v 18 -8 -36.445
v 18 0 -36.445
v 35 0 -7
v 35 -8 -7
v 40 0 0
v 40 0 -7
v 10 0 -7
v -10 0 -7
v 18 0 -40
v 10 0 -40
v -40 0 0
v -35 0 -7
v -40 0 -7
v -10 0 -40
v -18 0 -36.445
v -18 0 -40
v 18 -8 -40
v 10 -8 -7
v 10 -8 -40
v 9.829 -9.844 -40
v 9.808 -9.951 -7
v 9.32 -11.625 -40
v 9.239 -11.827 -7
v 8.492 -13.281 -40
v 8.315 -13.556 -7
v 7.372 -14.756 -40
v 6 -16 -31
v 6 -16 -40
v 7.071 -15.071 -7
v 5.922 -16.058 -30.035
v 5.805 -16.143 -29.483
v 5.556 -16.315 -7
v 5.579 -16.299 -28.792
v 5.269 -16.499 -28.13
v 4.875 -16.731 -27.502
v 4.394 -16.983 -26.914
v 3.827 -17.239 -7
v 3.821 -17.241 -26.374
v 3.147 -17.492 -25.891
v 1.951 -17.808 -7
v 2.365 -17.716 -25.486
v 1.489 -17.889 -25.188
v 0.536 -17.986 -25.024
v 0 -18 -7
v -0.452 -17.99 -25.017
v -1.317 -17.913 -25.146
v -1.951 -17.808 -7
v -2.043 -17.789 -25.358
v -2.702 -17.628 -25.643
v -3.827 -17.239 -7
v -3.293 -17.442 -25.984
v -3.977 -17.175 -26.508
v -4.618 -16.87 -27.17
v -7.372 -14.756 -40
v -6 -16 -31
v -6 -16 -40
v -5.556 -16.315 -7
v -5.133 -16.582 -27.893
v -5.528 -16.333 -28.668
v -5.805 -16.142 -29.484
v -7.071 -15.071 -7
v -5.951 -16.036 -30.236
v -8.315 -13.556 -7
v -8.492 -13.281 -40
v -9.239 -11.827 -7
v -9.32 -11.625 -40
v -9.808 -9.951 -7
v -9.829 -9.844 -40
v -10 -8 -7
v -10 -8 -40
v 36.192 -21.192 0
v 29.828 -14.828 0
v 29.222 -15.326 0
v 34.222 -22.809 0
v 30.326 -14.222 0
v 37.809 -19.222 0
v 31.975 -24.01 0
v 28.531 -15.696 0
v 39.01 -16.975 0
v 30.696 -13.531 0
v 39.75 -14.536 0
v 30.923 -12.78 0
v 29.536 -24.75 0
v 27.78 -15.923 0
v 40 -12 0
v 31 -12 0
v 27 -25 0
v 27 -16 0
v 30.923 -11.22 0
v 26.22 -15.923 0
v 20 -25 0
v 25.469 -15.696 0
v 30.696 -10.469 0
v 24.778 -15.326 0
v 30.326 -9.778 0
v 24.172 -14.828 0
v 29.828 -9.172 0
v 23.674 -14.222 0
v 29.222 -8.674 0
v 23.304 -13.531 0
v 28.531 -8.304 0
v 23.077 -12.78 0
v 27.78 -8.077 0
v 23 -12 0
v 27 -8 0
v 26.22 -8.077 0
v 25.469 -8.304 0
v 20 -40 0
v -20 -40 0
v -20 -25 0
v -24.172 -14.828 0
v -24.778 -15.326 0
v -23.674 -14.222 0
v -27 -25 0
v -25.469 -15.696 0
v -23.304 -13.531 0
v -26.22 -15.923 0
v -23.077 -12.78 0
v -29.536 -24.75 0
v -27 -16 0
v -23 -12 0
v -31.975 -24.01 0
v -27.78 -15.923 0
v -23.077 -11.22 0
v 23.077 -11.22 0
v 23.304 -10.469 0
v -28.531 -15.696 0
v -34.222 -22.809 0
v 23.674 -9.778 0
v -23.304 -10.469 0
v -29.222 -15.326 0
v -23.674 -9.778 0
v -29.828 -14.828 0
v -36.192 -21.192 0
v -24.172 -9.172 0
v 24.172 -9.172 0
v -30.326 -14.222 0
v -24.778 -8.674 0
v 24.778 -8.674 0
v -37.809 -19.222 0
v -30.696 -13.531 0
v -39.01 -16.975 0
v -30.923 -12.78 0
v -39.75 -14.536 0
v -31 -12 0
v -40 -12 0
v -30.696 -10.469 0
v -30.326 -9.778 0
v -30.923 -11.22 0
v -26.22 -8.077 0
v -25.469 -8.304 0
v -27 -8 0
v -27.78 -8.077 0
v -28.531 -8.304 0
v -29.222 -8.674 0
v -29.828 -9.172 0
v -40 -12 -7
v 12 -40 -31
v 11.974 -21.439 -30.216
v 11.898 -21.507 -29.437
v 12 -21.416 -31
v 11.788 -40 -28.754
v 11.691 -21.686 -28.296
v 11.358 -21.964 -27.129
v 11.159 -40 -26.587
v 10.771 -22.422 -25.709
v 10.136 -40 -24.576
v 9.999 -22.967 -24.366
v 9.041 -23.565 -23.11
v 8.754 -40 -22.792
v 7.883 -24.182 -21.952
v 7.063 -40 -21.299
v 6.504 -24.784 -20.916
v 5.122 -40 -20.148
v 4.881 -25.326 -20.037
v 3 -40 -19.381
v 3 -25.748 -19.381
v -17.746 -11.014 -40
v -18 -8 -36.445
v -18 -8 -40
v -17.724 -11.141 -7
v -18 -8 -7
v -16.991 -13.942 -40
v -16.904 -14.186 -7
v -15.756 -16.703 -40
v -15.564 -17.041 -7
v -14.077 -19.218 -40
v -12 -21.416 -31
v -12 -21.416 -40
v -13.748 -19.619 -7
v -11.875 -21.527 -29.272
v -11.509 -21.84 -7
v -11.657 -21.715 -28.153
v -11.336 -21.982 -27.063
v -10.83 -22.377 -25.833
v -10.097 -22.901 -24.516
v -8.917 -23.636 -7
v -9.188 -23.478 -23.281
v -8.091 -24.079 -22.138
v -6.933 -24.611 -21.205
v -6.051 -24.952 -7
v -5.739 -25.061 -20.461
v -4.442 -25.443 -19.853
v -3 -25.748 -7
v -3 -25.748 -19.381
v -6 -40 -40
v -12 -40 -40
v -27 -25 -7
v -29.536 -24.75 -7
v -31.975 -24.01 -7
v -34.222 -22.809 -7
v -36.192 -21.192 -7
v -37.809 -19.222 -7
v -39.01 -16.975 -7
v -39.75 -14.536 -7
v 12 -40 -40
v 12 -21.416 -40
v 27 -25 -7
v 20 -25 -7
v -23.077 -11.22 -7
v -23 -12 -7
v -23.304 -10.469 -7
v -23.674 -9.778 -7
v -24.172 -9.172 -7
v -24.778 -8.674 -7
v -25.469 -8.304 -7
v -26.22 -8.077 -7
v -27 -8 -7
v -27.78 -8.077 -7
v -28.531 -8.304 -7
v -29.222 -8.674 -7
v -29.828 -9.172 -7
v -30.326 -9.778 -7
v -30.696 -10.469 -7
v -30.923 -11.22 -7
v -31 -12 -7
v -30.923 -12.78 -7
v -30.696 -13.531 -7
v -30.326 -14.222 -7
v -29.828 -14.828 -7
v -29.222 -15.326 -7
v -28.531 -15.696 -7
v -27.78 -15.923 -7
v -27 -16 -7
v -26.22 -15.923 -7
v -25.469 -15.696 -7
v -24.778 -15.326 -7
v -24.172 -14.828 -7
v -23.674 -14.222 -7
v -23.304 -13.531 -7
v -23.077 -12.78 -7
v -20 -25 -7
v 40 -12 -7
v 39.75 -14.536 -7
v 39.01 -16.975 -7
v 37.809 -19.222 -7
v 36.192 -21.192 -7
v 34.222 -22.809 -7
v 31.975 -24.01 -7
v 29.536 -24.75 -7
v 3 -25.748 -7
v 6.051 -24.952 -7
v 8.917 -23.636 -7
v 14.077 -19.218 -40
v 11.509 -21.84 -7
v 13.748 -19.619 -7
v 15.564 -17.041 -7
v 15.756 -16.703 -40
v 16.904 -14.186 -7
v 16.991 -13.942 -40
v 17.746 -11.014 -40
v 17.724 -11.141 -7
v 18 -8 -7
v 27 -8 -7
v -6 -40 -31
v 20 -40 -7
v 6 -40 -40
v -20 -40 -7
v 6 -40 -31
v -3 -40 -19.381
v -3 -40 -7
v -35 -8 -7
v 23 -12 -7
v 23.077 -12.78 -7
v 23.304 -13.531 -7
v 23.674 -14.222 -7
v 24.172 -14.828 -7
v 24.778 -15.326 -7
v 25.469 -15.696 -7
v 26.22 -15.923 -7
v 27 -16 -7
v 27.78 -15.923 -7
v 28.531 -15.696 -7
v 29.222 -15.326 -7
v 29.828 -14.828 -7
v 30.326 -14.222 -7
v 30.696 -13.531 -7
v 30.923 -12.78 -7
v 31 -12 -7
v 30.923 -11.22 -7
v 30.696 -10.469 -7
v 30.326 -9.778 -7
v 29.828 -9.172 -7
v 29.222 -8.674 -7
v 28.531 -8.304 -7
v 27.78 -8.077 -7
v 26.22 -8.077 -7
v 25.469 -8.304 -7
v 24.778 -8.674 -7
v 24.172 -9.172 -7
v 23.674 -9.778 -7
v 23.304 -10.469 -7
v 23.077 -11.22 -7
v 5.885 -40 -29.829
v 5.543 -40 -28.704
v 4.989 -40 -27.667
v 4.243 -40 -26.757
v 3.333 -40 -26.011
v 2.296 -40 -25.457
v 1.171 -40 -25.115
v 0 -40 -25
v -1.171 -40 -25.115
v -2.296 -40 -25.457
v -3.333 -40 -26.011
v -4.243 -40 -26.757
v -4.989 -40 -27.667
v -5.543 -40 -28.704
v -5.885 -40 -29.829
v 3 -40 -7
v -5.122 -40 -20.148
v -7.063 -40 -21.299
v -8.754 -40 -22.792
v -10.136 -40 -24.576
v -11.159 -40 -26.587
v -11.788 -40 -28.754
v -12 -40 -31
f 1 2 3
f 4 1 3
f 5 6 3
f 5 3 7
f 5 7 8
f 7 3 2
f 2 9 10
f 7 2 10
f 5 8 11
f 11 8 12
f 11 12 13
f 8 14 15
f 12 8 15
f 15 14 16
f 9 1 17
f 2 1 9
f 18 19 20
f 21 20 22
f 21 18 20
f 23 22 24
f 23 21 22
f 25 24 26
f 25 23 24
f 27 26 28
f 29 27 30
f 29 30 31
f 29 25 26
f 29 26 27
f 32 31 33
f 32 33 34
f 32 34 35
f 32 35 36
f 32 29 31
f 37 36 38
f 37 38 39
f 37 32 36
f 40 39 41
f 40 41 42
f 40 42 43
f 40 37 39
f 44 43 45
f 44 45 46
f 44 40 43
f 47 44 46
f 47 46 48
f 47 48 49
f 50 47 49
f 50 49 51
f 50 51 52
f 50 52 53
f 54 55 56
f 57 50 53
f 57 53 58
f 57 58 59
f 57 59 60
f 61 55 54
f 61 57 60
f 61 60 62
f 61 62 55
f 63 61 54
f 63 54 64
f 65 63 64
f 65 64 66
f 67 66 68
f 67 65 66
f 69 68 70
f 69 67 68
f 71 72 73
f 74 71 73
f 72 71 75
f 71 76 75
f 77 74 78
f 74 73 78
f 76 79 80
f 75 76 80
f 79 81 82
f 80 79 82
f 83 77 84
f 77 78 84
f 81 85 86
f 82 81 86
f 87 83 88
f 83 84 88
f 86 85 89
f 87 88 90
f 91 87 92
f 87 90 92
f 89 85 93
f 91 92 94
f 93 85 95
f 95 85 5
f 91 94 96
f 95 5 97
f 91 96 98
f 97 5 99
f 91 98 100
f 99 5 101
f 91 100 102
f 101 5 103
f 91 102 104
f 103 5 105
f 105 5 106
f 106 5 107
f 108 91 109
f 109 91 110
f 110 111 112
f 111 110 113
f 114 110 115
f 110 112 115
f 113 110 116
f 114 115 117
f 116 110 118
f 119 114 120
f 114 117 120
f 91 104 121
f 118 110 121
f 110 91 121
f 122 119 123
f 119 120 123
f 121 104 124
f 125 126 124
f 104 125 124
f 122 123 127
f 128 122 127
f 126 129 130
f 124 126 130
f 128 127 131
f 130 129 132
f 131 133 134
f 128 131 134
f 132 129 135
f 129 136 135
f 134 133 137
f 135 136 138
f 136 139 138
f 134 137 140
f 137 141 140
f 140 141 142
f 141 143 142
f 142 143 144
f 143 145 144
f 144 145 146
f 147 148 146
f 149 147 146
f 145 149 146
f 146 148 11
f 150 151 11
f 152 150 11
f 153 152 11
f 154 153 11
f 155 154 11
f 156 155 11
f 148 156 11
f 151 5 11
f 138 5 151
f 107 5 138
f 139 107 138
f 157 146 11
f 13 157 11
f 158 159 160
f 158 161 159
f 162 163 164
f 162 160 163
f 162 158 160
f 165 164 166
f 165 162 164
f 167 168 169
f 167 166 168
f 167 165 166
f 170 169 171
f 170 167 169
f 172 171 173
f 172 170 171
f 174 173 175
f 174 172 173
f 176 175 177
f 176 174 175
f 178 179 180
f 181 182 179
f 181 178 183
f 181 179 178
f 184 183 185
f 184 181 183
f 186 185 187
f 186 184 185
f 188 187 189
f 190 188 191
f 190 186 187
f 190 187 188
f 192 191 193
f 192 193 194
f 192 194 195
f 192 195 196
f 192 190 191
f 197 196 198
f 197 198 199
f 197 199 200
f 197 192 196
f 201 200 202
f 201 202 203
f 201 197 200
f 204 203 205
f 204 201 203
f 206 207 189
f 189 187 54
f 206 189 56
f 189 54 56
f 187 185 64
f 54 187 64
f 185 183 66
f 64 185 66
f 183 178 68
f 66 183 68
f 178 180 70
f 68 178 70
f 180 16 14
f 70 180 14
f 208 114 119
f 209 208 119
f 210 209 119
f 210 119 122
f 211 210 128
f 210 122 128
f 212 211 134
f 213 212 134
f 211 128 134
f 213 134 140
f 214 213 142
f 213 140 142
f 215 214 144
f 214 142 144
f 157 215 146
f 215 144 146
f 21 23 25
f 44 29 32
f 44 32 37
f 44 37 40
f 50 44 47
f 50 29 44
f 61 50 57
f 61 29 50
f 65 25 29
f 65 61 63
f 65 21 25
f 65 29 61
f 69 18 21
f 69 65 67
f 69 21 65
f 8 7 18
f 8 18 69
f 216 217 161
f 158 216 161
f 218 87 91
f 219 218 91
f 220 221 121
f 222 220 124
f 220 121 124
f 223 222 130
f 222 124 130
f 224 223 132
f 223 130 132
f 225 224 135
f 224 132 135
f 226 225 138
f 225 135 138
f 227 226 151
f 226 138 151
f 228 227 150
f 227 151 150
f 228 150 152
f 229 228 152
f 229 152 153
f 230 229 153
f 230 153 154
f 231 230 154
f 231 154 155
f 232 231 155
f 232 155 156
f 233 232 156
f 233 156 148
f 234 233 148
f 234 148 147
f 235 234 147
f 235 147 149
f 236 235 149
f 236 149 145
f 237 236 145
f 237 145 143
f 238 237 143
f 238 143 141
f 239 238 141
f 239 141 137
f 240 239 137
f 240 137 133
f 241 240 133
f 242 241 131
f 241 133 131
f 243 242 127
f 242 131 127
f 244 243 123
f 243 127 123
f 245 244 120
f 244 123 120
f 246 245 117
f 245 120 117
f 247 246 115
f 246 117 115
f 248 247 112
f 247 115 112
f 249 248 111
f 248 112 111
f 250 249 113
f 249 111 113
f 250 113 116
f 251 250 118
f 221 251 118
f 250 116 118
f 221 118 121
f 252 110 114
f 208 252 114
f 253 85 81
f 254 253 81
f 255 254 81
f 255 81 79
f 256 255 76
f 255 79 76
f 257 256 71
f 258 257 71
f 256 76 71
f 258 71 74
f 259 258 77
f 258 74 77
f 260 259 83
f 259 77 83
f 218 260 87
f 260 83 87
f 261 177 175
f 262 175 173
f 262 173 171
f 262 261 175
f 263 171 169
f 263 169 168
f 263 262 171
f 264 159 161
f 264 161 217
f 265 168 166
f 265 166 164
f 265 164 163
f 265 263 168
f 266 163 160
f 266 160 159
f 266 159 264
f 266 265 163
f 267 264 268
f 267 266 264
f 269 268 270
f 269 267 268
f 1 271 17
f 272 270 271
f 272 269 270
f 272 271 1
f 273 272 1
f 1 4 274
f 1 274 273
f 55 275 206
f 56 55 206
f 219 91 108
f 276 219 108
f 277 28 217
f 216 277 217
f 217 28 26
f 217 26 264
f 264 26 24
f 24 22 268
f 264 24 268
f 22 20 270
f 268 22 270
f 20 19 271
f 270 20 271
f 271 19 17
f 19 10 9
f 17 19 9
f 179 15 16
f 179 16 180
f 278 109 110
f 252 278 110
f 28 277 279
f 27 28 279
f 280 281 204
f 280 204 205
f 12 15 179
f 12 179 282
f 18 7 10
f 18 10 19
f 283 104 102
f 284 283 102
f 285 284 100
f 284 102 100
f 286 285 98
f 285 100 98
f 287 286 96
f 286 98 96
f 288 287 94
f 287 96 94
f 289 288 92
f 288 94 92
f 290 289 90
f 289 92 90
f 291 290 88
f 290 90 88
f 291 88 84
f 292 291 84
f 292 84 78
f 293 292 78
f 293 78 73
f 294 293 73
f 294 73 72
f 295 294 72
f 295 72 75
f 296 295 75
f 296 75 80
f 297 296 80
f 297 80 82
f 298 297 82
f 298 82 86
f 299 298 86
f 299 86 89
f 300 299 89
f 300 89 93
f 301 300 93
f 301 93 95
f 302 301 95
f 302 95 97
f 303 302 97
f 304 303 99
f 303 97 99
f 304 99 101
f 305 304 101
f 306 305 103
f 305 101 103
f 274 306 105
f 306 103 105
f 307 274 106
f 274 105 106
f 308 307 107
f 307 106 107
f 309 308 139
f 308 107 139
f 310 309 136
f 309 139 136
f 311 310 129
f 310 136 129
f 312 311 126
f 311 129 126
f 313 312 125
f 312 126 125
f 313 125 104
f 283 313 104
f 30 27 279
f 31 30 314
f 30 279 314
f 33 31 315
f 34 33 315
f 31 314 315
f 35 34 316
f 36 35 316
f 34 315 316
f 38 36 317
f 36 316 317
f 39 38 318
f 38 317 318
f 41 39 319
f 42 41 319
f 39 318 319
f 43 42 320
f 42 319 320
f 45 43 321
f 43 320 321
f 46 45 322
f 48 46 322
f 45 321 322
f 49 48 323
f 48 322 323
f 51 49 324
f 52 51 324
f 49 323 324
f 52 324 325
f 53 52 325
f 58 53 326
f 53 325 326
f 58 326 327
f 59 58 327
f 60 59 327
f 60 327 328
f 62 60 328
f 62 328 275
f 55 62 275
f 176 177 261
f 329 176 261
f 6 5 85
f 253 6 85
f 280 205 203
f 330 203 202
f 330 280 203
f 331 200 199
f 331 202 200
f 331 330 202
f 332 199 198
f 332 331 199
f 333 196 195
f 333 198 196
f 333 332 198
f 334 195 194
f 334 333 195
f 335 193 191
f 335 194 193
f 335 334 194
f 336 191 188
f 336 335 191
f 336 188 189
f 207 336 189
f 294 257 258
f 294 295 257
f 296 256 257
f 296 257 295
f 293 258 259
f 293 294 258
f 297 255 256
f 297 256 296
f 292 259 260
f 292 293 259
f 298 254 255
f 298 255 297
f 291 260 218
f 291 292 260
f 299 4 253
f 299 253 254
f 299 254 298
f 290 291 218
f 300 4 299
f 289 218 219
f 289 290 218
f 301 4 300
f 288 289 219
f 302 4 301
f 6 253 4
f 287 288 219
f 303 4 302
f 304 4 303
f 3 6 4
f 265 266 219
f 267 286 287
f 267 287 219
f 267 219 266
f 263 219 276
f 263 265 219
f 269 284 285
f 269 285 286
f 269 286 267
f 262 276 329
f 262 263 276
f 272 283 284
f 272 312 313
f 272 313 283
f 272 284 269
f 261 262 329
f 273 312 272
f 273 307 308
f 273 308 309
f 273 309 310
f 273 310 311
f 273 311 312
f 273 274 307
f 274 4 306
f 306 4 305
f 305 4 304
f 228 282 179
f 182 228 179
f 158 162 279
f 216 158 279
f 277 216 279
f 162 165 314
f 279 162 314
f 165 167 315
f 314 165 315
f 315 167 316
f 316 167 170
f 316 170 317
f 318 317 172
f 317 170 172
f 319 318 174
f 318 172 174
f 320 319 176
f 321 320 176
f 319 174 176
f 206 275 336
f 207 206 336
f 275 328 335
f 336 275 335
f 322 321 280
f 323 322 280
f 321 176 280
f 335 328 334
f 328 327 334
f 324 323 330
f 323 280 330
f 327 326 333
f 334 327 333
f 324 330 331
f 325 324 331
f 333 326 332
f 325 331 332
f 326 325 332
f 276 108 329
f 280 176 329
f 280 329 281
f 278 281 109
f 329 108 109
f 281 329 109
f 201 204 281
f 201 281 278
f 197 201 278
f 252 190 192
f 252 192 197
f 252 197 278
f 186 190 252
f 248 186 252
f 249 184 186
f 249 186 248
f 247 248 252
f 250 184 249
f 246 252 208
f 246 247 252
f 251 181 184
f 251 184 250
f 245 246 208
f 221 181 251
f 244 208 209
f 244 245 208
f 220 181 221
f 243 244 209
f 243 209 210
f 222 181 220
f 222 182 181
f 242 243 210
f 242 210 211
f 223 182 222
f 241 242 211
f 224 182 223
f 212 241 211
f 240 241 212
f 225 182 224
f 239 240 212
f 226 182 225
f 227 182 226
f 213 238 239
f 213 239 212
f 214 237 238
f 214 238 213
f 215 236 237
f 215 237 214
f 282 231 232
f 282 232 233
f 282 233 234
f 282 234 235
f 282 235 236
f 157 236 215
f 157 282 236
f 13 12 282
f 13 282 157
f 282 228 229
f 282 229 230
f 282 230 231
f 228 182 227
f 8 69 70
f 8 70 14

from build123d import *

# Parameters (mm, degrees)
SKETCH_1_R           = 4
EXTRUDE_1_DEPTH      = 7
EXTRUDE_2_DEPTH      = 33
EXTRUDE_3_DEPTH      = 8
EXTRUDE_4_REACH      = 71.282
EXTRUDE_4_END_RADIUS = 18
CUT_EXTRUDE_1_DEPTH  = 70.28203236


with BuildPart() as part:
    # 草图1 → 凸台-拉伸1 (new body)
    with BuildSketch(Plane.XY):
        with BuildLine():
            Line((-40, 0), (40, 0))
            Line((40, 0), (40, -12))
            ThreePointArc((40, -12), (36.192388155, -21.192388155), (27, -25))
            Line((27, -25), (20, -25))
            Line((20, -25), (20, -40))
            Line((20, -40), (-20, -40))
            Line((-20, -40), (-20, -25))
            Line((-20, -25), (-27, -25))
            ThreePointArc((-27, -25), (-36.192388155, -21.192388155), (-40, -12))
            Line((-40, -12), (-40, 0))
        make_face()
        with Locations((-27, -12)):
            Circle(SKETCH_1_R, mode=Mode.SUBTRACT)
        with Locations(Location((27, -12, 0), (0, 0, 180))):
            Circle(SKETCH_1_R, mode=Mode.SUBTRACT)
    extrude(amount=-EXTRUDE_1_DEPTH)

    # 草图2 → 凸台-拉伸2 (add)
    with BuildSketch(Plane(origin=(0, 0, -7), x_dir=(-1, 0, 0), z_dir=(0, 0, -1))):
        with BuildLine():
            Line((-10, 0), (-10, -8))
            ThreePointArc((-10, -8), (0, -18), (10, -8))
            Line((10, -8), (10, 0))
            Line((10, 0), (18, 0))
            Line((18, 0), (18, -8))
            ThreePointArc((18, -8), (0, -26), (-18, -8))
            Line((-18, -8), (-18, 0))
            Line((-18, 0), (-10, 0))
        make_face()
    extrude(amount=EXTRUDE_2_DEPTH)

    # 草图3 → 凸台-拉伸3 (add)
    with BuildSketch(Plane(origin=(0, 0, 0), x_dir=(1, 0, 0), z_dir=(0, 1, 0))):
        Polygon((18, 36.444863729), (35, 7), (18, 7), align=None)
        Polygon((-18, 36.444863729), (-35, 7), (-18, 7), align=None)
    extrude(amount=-EXTRUDE_3_DEPTH)

    # 凸台-拉伸4: up to this cylinder (the profile starts outside it)
    extrude_4_end = Plane(origin=(0, -8, -28.116235), z_dir=(0, 0, 1)) * Cylinder(EXTRUDE_4_END_RADIUS, 179.564, mode=Mode.PRIVATE)
    # 草图4 → 凸台-拉伸4 (add, up to the surface)
    with BuildSketch(Plane.XZ.offset(40), mode=Mode.PRIVATE) as extrude_4_sk1:
        with BuildLine():
            Line((12, -40), (12, -31))
            ThreePointArc((12, -31), (9.486832981, -23.651530772), (3, -19.381049961))
            Line((3, -19.381049961), (3, -7))
            Line((3, -7), (-3, -7))
            Line((-3, -7), (-3, -19.381049961))
            ThreePointArc((-3, -19.381049961), (-9.486832981, -23.651530772), (-12, -31))
            Line((-12, -31), (-12, -40))
            Line((-12, -40), (12, -40))
        make_face()
    extrude_4_tool1 = extrude(extrude_4_sk1.sketch, amount=-EXTRUDE_4_REACH, mode=Mode.PRIVATE) - extrude_4_end
    add(extrude_4_tool1.solids().sort_by_distance((0, -40, -28.116235))[0])

    # 草图5 → 切除-拉伸1 (cut, through all)
    with BuildSketch(Plane.XZ.offset(40)):
        with BuildLine():
            Line((6, -40), (6, -31))
            ThreePointArc((6, -31), (0, -25), (-6, -31))
            Line((-6, -31), (-6, -40))
            Line((-6, -40), (6, -40))
        make_face()
    extrude(amount=-CUT_EXTRUDE_1_DEPTH, mode=Mode.SUBTRACT)


solid = part.part
